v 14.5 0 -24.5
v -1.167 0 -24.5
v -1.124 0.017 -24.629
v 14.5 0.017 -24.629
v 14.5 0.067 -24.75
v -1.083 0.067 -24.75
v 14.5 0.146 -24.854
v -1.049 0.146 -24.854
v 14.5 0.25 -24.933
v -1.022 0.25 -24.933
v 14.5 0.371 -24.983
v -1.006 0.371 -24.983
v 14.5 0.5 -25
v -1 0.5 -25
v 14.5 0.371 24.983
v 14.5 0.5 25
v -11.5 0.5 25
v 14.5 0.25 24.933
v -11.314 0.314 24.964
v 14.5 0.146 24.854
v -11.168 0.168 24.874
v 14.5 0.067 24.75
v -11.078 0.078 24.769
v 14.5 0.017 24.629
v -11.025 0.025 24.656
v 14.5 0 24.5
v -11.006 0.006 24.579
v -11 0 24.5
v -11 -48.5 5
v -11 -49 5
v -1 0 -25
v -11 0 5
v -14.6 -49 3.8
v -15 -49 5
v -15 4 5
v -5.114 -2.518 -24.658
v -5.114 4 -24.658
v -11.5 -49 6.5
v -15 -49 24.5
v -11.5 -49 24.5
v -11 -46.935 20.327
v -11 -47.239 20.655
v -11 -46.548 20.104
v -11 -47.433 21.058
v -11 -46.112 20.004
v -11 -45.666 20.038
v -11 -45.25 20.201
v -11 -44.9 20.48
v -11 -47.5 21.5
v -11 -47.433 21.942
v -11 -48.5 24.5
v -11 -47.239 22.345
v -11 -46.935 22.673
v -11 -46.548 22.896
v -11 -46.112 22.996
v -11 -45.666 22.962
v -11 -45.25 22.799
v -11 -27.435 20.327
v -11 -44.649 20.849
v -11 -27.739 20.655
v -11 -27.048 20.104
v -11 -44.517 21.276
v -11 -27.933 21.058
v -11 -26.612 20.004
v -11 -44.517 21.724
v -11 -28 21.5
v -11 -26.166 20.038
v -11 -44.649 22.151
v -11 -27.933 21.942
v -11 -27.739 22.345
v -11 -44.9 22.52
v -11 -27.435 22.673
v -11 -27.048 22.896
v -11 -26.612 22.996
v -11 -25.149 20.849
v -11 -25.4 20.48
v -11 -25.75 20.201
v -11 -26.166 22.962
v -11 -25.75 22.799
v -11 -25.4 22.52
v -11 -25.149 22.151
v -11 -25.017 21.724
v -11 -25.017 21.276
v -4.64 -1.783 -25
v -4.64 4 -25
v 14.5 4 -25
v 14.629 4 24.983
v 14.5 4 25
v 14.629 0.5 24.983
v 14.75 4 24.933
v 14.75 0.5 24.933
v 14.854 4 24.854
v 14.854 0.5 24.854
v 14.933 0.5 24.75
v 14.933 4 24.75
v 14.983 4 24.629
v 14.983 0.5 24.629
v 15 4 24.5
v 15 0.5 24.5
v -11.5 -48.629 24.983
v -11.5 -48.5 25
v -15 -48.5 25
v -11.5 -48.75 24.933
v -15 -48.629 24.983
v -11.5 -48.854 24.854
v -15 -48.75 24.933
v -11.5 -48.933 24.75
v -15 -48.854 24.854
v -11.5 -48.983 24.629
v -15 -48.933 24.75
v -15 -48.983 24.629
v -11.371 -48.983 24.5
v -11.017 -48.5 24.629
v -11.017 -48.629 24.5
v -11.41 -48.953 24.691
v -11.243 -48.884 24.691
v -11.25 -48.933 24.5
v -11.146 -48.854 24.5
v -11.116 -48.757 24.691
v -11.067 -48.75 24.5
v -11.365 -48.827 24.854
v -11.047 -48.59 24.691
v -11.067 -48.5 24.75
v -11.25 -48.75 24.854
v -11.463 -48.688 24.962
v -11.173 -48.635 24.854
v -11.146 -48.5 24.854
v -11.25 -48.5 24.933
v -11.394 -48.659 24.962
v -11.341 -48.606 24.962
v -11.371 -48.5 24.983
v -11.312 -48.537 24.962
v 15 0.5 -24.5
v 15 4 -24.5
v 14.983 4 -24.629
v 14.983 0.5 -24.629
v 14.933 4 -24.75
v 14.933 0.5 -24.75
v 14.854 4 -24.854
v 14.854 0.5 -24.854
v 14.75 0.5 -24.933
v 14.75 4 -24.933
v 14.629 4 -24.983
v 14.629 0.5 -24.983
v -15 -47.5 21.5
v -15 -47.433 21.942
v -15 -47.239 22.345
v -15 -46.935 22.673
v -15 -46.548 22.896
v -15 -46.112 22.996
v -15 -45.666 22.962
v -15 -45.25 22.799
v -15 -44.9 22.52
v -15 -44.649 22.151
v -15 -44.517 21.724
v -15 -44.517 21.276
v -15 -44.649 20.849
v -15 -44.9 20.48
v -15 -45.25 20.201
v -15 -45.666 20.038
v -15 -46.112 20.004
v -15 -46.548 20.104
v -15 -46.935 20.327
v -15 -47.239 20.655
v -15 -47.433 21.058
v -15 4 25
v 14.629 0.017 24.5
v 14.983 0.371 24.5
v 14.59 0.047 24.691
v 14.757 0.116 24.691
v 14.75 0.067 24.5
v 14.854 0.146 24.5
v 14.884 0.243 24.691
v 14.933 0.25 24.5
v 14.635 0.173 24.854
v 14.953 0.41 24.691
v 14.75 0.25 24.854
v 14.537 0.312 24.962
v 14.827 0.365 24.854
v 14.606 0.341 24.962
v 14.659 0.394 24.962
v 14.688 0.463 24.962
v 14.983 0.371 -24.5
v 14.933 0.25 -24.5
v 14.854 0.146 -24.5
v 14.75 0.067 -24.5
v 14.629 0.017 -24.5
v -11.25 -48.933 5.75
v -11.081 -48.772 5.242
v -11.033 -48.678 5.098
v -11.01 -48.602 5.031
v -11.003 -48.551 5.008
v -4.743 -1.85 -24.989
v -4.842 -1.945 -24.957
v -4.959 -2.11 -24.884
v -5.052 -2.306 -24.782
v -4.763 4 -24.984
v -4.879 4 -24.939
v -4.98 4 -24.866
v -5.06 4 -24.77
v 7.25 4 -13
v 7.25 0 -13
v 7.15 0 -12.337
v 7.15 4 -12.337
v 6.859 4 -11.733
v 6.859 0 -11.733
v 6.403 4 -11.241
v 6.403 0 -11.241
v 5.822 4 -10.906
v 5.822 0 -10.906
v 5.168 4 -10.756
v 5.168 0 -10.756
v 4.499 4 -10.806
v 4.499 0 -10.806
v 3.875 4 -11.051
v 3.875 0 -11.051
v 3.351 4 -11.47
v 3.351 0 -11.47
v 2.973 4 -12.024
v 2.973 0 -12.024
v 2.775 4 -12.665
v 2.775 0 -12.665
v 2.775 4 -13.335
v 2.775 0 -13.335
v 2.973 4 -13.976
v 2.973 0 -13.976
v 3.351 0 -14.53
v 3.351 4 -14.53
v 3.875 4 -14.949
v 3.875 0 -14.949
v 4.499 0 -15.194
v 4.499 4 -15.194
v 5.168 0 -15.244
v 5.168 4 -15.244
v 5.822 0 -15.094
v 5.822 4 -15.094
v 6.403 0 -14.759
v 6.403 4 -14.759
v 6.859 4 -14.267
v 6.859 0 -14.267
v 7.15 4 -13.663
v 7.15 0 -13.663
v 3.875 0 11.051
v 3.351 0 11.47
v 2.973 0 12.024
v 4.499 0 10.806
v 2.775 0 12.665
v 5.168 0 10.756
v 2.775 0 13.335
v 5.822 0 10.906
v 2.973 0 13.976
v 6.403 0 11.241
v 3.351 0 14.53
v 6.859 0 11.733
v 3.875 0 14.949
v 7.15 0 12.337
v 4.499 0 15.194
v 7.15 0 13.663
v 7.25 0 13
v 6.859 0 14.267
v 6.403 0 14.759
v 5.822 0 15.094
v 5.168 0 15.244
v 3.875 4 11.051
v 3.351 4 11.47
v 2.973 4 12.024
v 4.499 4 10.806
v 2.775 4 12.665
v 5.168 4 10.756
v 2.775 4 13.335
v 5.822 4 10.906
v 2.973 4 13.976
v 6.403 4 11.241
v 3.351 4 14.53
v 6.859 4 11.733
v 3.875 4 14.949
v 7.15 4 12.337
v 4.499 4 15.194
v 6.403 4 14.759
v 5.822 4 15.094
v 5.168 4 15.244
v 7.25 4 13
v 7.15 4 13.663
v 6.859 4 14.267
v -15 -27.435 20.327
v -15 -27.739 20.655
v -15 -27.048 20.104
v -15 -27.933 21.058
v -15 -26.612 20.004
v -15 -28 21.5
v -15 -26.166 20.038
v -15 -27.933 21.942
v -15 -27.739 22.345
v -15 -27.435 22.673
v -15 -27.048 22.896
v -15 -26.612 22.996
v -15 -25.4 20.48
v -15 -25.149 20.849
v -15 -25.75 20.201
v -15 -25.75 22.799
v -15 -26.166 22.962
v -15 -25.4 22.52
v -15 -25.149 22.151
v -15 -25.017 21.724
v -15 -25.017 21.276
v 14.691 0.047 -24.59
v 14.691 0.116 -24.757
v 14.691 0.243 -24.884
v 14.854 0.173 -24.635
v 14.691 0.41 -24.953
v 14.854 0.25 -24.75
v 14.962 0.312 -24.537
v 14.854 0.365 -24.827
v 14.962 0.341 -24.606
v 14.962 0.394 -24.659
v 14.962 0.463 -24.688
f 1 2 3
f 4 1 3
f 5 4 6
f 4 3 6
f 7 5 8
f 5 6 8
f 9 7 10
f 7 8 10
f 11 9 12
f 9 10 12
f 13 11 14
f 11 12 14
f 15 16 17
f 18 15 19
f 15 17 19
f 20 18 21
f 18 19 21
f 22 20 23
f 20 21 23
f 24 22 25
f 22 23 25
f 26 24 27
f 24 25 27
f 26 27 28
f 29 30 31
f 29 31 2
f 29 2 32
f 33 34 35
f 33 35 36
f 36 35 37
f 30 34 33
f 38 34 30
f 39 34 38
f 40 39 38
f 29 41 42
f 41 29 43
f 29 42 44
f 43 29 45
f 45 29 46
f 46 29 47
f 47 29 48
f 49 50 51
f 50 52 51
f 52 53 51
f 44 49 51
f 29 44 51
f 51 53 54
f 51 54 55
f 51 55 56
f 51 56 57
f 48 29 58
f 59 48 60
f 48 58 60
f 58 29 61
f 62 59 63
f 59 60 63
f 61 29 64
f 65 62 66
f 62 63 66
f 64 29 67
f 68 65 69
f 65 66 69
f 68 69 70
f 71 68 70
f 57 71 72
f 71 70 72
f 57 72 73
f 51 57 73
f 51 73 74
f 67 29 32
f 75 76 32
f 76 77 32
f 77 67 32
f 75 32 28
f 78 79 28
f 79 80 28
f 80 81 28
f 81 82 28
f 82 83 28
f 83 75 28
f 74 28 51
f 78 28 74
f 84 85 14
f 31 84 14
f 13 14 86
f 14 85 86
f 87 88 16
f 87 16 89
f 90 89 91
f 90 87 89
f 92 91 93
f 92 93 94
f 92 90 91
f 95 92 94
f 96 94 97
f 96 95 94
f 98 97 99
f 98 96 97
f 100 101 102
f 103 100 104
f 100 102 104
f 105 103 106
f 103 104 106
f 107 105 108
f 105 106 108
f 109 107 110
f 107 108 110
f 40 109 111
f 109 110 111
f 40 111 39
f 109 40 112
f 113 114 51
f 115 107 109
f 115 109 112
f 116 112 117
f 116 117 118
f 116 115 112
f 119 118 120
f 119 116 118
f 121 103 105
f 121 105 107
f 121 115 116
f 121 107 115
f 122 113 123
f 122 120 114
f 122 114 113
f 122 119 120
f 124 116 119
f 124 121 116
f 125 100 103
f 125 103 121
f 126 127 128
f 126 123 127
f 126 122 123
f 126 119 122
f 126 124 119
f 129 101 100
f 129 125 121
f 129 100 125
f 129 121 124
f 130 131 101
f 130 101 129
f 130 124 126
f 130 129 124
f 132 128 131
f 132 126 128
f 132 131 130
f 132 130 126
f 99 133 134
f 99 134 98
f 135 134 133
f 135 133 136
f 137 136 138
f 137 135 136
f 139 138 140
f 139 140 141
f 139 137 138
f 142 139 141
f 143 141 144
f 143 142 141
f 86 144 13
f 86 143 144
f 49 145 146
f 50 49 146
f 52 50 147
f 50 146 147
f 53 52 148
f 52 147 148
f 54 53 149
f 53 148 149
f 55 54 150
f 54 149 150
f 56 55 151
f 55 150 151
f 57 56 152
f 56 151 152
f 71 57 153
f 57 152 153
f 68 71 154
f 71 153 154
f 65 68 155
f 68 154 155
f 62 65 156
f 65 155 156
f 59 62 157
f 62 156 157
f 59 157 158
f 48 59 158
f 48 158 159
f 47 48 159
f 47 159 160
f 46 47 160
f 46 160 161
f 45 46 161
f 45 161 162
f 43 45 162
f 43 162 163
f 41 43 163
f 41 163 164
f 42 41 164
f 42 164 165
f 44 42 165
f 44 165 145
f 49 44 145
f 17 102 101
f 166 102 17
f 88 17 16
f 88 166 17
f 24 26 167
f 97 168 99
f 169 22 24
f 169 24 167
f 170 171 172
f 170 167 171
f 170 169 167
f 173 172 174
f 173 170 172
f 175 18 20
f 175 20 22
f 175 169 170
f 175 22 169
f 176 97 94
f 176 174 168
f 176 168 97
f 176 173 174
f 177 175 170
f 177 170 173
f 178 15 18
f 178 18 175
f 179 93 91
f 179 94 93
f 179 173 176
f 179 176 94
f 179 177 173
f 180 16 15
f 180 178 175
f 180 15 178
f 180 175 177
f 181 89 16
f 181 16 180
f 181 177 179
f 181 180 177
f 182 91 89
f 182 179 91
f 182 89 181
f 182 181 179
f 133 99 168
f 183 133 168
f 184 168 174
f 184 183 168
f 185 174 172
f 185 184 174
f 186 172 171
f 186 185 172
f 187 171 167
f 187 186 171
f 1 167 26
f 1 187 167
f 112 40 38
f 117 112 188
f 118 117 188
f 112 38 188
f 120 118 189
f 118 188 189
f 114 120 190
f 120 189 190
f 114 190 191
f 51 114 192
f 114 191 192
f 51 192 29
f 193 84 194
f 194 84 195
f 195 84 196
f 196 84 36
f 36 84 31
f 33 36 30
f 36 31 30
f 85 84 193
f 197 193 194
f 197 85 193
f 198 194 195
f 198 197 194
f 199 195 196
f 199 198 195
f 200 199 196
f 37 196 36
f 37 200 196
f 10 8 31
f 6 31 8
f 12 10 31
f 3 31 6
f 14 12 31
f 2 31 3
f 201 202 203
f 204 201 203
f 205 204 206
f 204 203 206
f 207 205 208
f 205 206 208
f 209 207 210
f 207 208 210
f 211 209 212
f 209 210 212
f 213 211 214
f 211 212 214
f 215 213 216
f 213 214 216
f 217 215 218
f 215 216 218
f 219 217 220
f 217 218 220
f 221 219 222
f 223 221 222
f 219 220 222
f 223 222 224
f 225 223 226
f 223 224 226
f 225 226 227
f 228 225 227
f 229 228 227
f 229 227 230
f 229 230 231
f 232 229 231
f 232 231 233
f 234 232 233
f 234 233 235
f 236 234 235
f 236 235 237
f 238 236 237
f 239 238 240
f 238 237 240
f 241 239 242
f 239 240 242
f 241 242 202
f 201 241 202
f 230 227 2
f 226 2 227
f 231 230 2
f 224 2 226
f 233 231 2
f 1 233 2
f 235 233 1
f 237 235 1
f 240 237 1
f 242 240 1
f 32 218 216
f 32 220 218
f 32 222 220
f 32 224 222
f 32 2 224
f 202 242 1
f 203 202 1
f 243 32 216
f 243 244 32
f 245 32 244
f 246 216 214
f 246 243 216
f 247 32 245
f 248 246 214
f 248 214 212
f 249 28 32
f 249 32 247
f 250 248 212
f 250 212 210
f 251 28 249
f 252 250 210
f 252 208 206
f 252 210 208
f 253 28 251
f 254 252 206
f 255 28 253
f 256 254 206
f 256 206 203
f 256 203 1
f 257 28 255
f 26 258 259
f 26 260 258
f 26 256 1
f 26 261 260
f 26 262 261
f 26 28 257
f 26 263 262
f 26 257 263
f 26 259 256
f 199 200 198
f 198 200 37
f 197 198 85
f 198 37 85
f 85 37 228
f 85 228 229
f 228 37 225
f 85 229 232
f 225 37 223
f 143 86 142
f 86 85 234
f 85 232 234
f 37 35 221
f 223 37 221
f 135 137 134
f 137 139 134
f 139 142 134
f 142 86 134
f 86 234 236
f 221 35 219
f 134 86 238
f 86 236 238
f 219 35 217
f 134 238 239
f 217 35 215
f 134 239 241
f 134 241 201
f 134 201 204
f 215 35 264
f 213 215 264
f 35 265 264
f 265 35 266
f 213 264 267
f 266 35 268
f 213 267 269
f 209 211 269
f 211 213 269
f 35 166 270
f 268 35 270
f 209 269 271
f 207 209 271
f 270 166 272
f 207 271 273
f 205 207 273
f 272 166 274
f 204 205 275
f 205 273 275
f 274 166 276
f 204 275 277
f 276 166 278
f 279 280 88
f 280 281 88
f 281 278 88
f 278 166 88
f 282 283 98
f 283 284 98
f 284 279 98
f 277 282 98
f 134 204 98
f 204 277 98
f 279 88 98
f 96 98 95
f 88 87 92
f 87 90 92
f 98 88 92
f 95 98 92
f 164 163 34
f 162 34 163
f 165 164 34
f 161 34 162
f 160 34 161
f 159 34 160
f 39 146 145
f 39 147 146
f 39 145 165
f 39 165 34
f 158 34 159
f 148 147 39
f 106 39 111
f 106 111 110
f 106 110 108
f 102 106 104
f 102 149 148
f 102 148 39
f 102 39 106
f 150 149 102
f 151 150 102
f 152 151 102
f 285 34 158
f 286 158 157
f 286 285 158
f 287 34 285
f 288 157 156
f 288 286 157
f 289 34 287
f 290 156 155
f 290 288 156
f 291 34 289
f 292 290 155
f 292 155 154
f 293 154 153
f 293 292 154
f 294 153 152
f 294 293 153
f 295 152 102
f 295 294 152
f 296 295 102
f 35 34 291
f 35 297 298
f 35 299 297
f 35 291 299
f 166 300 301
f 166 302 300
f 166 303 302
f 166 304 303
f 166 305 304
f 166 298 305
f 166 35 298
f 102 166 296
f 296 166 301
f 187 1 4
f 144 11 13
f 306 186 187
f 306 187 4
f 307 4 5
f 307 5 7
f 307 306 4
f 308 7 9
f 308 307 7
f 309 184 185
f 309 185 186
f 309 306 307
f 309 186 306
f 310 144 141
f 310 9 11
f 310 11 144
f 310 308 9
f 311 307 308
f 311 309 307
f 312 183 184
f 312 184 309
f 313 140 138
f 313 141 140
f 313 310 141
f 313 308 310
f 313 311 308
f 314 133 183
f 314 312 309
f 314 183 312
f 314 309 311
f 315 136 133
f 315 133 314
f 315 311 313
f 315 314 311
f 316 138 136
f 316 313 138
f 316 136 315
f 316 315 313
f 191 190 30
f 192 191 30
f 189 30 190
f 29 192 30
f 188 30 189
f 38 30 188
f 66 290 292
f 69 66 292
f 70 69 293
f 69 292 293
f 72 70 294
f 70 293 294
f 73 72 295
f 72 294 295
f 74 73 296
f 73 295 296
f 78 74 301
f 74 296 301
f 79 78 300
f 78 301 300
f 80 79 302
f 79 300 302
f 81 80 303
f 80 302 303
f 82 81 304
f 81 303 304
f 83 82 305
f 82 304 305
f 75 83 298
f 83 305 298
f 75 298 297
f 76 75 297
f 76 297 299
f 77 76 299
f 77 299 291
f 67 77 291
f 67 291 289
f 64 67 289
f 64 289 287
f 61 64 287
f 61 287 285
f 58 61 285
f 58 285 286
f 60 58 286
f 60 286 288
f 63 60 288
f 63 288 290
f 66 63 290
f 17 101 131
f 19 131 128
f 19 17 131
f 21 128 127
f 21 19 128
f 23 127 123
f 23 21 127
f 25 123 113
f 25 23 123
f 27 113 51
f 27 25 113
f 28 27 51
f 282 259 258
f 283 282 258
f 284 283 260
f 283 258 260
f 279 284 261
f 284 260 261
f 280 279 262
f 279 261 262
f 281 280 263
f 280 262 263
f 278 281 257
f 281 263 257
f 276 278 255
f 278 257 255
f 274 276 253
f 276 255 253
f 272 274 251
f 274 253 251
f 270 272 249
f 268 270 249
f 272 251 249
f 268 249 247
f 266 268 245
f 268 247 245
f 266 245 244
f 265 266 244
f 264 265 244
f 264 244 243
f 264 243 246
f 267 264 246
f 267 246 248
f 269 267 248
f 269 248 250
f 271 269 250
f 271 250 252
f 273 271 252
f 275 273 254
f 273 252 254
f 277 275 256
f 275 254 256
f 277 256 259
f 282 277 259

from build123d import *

# Parameters (mm, degrees)
F0_R         = 2.25
F0_W         = 4
F0_H         = 20
F1_DEPTH     = 4
F2_W         = 4
F2_H         = 20
F3_DEPTH     = 49
F5_DEPTH     = 13.2825661727
F6_T1_DEPTH  = 4.75
F6_T3_DEPTH  = 48.5
F6_T5_DEPTH  = 25.5
F6_T7_DEPTH  = 49
F6_T9_DEPTH  = 4.75
F6_T11_DEPTH = 7.7618980501
F6_S15_W     = 0.51
F6_S15_H     = 0.51
F6_T16_DEPTH = 0.51
F6_S21_W     = 0.51
F6_S21_H     = 0.51
F6_T22_DEPTH = 0.51
F6_S27_W     = 0.51
F6_S27_H     = 0.51
F6_T28_DEPTH = 0.51
F6_T34_DEPTH = 16.75
F6_T39_DEPTH = 20.75
F6_T45_DEPTH = 49.75
F6_T49_DEPTH = 26.75
F7_R         = 1.5
F8_DEPTH     = 30.001


# Not quite as in the source:
# - a fillet or chamfer that OpenCascade refuses, or shapes differently, is made with other operations: its cross-section is extruded or revolved along the edge and cut away or added


with BuildPart() as f1:
    # F0 (on Front) → F1 (new body)
    with BuildSketch(Plane.XZ):
        Polygon((15, 25), (-11, 25), (-11, 5), (-1, -25), (15, -25), align=None)
        with Locations((5, -13)):
            Circle(F0_R, mode=Mode.SUBTRACT)
        with Locations((5, 13)):
            Circle(F0_R, mode=Mode.SUBTRACT)
        with Locations((-13, 15)):
            Rectangle(F0_W, F0_H)
        Polygon((-11, 5), (-15, 5), (-5, -25), (-1, -25), align=None)
    extrude(amount=-F1_DEPTH)

    # F2 (on face) → F3 (join)
    with BuildSketch(Plane.XZ):
        with Locations((-13, 15)):
            Rectangle(F2_W, F2_H)
        Polygon((-11, 5), (-15, 5), (-5, -25), (-1, -25), align=None)
    extrude(amount=F3_DEPTH)

    # F4 (on face) → F5 (cut, through all)
    with BuildSketch(Plane(origin=(-8.4, 0, -2.8), x_dir=(0, 1, 0), z_dir=(0.9486832981, 0, 0.316227766))):
        Polygon((0, -23.4008546852), (-49, 8.2219219164), (-49, -23.4008546852), align=None)
    extrude(amount=-F5_DEPTH, mode=Mode.SUBTRACT)

    # F6: fillet of radius 0.5 on 9 edges, made by hand

    # F6_s2 → F6_t1 (cut)
    with BuildSketch(Plane.YZ.offset(-16.25)):
        with BuildLine():
            ThreePointArc((-48.5, 25), (-48.8535533906, 24.8535533906), (-49, 24.5))
            Line((-49, 24.5), (-49, 25))
            Line((-49, 25), (-48.5, 25))
        make_face()
    extrude(amount=F6_T1_DEPTH, mode=Mode.SUBTRACT)

    # F6_s4 → F6_t3 (cut)
    with BuildSketch(Plane.XZ):
        with BuildLine():
            ThreePointArc((-11.5, 25), (-11.1464466094, 24.8535533906), (-11, 24.5))
            Line((-11, 24.5), (-11, 25))
            Line((-11, 25), (-11.5, 25))
        make_face()
    extrude(amount=F6_T3_DEPTH, mode=Mode.SUBTRACT)

    # F6_s6 → F6_t5 (cut)
    with BuildSketch(Plane.YZ.offset(-11)):
        with BuildLine():
            ThreePointArc((0.5, 25), (0.1464466094, 24.8535533906), (0, 24.5))
            Line((0, 24.5), (0, 25))
            Line((0, 25), (0.5, 25))
        make_face()
    extrude(amount=F6_T5_DEPTH, mode=Mode.SUBTRACT)

    # F6_s8 → F6_t7 (cut)
    with BuildSketch(Plane.XY.offset(-24.5)):
        with BuildLine():
            ThreePointArc((15, 0.5), (14.8535533906, 0.1464466094), (14.5, 0))
            Line((14.5, 0), (15, 0))
            Line((15, 0), (15, 0.5))
        make_face()
    extrude(amount=F6_T7_DEPTH, mode=Mode.SUBTRACT)

    # F6_s10 → F6_t9 (cut)
    with BuildSketch(Plane.XZ.offset(-5.25)):
        with BuildLine():
            ThreePointArc((14.5, 25), (14.8535533906, 24.8535533906), (15, 24.5))
            Line((15, 24.5), (15, 25))
            Line((15, 25), (14.5, 25))
        make_face()
        with BuildLine():
            ThreePointArc((15, -24.5), (14.8535533906, -24.8535533906), (14.5, -25))
            Line((14.5, -25), (15, -25))
            Line((15, -25), (15, -24.5))
        make_face()
    extrude(amount=F6_T9_DEPTH, mode=Mode.SUBTRACT)

    # F6_s12 → F6_t11 (cut)
    with BuildSketch(Plane.XZ.offset(-4.9009490251)):
        with BuildLine():
            ThreePointArc((-4.63962039, -25), (-4.9319755323, -24.9056210926), (-5.113962039, -24.658113883))
            Line((-5.113962039, -24.658113883), (-5, -25))
            Line((-5, -25), (-4.63962039, -25))
        make_face()
    extrude(amount=F6_T11_DEPTH, mode=Mode.SUBTRACT)


with BuildPart() as f6_tool14:
    # F6_s15 → F6_t16 (new body)
    with BuildSketch(Plane.XY.offset(24.5)):
        with Locations((-11.245, -48.755)):
            Rectangle(F6_S15_W, F6_S15_H)
    extrude(amount=F6_T16_DEPTH)

    # F6_s17 → F6_t18 (revolve, cut)
    with BuildSketch(Plane(origin=(-11.5, -48.5, 24.5), x_dir=(-0.7071067812, 0.7071067812, 0), z_dir=(0.7071067812, 0.7071067812, 0))):
        with BuildLine():
            ThreePointArc((0, -0.5), (0.5, 0), (0, 0.5))
            Line((0, 0.5), (0, -0.5))
        make_face()
    revolve(axis=Axis((-11.5, -48.5, 24.5), (0, 0, 1)), mode=Mode.SUBTRACT)


with BuildPart() as f1_1:
    add(f1.part)

    # F6_t13: cut F6_tool14
    add(f6_tool14.part, mode=Mode.SUBTRACT)


with BuildPart() as f6_tool20:
    # F6_s21 → F6_t22 (new body)
    with BuildSketch(Plane.XY.offset(24.5)):
        with Locations((14.755, 0.245)):
            Rectangle(F6_S21_W, F6_S21_H)
    extrude(amount=F6_T22_DEPTH)

    # F6_s23 → F6_t24 (revolve, cut)
    with BuildSketch(Plane(origin=(14.5, 0.5, 24.5), x_dir=(-0.7071067812, 0.7071067812, 0), z_dir=(0.7071067812, 0.7071067812, 0))):
        with BuildLine():
            ThreePointArc((0, -0.5), (0.5, 0), (0, 0.5))
            Line((0, 0.5), (0, -0.5))
        make_face()
    revolve(axis=Axis((14.5, 0.5, 24.5), (0, 0, 1)), mode=Mode.SUBTRACT)


with BuildPart() as f1_2:
    add(f1_1.part)

    # F6_t19: cut F6_tool20
    add(f6_tool20.part, mode=Mode.SUBTRACT)


with BuildPart() as f6_tool26:
    # F6_s27 → F6_t28 (new body)
    with BuildSketch(Plane.YZ.offset(14.5)):
        with Locations((0.245, -24.755)):
            Rectangle(F6_S27_W, F6_S27_H)
    extrude(amount=F6_T28_DEPTH)

    # F6_s29 → F6_t30 (revolve, cut)
    with BuildSketch(Plane(origin=(14.5, 0.5, -24.5), x_dir=(0, 0.7071067812, 0.7071067812), z_dir=(0, 0.7071067812, -0.7071067812))):
        with BuildLine():
            ThreePointArc((0, -0.5), (0.5, 0), (0, 0.5))
            Line((0, 0.5), (0, -0.5))
        make_face()
    revolve(axis=Axis((14.5, 0.5, -24.5), (1, 0, 0)), mode=Mode.SUBTRACT)


with BuildPart() as f1_3:
    add(f1_2.part)

    # F6_t25: cut F6_tool26
    add(f6_tool26.part, mode=Mode.SUBTRACT)


with BuildPart() as f6_tool32:
    # F6_s33 → F6_t34 (new body)
    with BuildSketch(Plane.YZ.offset(-2.25)):
        with BuildLine():
            ThreePointArc((0, -24.5), (0.1464466094, -24.8535533906), (0.5, -25))
            Line((0.5, -25), (0, -25))
            Line((0, -25), (0, -24.5))
        make_face()
    extrude(amount=F6_T34_DEPTH)

    split(bisect_by=Plane(origin=(-8.4, 0, -2.8), x_dir=(0, 1, 0), z_dir=(0.9486832981, 0, 0.316227766)), keep=Keep.TOP)


with BuildPart() as f1_4:
    add(f1_3.part)

    # F6_t31: cut F6_tool32
    add(f6_tool32.part, mode=Mode.SUBTRACT)


with BuildPart() as f6_tool37:
    # F6_s38 → F6_t39 (new body)
    with BuildSketch(Plane.XY.offset(3.75)):
        with BuildLine():
            ThreePointArc((-11.5, -49), (-11.1464466094, -48.8535533906), (-11, -48.5))
            Line((-11, -48.5), (-11, -49))
            Line((-11, -49), (-11.5, -49))
        make_face()
    extrude(amount=F6_T39_DEPTH)

    split(bisect_by=Plane(origin=(-8.4, 0, -2.8), x_dir=(0, 1, 0), z_dir=(0.9486832981, 0, 0.316227766)), keep=Keep.TOP)


with BuildPart() as f1_5:
    add(f1_4.part)

    # F6_t36: cut F6_tool37
    add(f6_tool37.part, mode=Mode.SUBTRACT)


with BuildPart() as f6_tool43:
    # F6_s44 → F6_t45 (new body)
    with BuildSketch(Plane.XZ.offset(-1.25)):
        with BuildLine():
            ThreePointArc((-11.5, 25), (-11.1464466094, 24.8535533906), (-11, 24.5))
            Line((-11, 24.5), (-11, 25))
            Line((-11, 25), (-11.5, 25))
        make_face()
    extrude(amount=F6_T45_DEPTH)

    split(bisect_by=Plane.XZ, keep=Keep.BOTTOM)


with BuildPart() as f6_tool47:
    # F6_s48 → F6_t49 (new body)
    with BuildSketch(Plane.YZ.offset(14.5)):
        with BuildLine():
            ThreePointArc((0.5, 25), (0.1464466094, 24.8535533906), (0, 24.5))
            Line((0, 24.5), (0, 25))
            Line((0, 25), (0.5, 25))
        make_face()
    extrude(amount=-F6_T49_DEPTH)

    split(bisect_by=Plane.YZ.offset(-11), keep=Keep.BOTTOM)


with BuildPart() as f6_tool43_1:
    add(f6_tool43.part)

    # F6_t51: intersect F6_tool47
    add(f6_tool47.part, mode=Mode.INTERSECT)


with BuildPart() as f1_6:
    add(f1_5.part)

    # F6_t41: cut F6_tool43
    add(f6_tool43_1.part, mode=Mode.SUBTRACT)

    # F7 (on face) → F8 (cut, through all)
    with BuildSketch(Plane(origin=(-15, 0, 0), x_dir=(0, -1, 0), z_dir=(-1, 0, 0))):
        with Locations((26.5, 21.5)):
            Circle(F7_R)
        with Locations((46, 21.5)):
            Circle(F7_R)
    extrude(amount=-F8_DEPTH, mode=Mode.SUBTRACT)


solid = f1_6.part
